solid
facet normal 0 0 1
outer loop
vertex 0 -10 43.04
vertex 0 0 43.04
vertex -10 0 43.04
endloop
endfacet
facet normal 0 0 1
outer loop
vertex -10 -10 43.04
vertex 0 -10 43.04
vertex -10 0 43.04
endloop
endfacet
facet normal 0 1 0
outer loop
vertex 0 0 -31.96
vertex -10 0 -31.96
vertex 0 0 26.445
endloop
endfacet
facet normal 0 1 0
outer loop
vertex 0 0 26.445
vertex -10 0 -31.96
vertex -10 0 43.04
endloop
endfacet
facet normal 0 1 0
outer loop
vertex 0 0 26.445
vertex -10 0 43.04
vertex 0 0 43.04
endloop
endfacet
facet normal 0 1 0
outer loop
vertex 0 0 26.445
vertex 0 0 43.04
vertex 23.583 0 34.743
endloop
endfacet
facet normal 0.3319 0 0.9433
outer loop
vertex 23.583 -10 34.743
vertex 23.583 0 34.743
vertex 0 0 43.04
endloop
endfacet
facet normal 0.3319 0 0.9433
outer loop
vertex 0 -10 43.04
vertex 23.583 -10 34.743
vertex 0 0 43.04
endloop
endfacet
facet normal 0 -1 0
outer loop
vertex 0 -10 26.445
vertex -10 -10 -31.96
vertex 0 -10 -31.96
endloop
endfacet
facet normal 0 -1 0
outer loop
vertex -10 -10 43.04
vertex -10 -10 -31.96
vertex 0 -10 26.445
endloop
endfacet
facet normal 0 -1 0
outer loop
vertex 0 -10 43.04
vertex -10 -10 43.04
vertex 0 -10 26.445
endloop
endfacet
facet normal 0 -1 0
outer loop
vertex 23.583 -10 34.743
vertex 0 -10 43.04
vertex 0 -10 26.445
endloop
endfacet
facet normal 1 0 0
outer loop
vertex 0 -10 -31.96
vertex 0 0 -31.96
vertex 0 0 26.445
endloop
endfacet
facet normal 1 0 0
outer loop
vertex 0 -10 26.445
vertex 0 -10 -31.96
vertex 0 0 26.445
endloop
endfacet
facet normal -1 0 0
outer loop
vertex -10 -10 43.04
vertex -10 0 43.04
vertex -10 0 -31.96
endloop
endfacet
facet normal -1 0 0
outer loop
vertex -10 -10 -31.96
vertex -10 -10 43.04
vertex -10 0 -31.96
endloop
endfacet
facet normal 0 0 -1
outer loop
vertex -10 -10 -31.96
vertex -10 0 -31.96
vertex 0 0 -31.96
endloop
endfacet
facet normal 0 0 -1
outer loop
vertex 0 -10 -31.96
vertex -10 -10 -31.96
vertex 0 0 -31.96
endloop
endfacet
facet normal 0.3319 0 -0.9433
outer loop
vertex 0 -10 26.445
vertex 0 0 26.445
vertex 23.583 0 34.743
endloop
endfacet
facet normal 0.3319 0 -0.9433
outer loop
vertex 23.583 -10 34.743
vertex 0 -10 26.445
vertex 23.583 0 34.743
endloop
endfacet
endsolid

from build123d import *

# Parameters (mm, degrees)
F1_DEPTH = 10
F2_DEPTH = 10


with BuildPart() as f1:
    # F0 (on Front) → F1 (new body)
    with BuildSketch(Plane.XZ):
        Polygon((0, 26.44526), (0, 43.04029), (-10, 43.04029), (-10, -31.95971), (0, -31.95971), align=None)
    extrude(amount=F1_DEPTH)

    # F0 (on Front) → F2 (join)
    with BuildSketch(Plane.XZ):
        Polygon((0, 26.44526), (0, 43.04029), (-10, 43.04029), (-10, -31.95971), (0, -31.95971), align=None)
        Polygon((23.582859, 34.742775), (0, 43.04029), (0, 26.44526), align=None)
    extrude(amount=F2_DEPTH)


solid = f1.part
